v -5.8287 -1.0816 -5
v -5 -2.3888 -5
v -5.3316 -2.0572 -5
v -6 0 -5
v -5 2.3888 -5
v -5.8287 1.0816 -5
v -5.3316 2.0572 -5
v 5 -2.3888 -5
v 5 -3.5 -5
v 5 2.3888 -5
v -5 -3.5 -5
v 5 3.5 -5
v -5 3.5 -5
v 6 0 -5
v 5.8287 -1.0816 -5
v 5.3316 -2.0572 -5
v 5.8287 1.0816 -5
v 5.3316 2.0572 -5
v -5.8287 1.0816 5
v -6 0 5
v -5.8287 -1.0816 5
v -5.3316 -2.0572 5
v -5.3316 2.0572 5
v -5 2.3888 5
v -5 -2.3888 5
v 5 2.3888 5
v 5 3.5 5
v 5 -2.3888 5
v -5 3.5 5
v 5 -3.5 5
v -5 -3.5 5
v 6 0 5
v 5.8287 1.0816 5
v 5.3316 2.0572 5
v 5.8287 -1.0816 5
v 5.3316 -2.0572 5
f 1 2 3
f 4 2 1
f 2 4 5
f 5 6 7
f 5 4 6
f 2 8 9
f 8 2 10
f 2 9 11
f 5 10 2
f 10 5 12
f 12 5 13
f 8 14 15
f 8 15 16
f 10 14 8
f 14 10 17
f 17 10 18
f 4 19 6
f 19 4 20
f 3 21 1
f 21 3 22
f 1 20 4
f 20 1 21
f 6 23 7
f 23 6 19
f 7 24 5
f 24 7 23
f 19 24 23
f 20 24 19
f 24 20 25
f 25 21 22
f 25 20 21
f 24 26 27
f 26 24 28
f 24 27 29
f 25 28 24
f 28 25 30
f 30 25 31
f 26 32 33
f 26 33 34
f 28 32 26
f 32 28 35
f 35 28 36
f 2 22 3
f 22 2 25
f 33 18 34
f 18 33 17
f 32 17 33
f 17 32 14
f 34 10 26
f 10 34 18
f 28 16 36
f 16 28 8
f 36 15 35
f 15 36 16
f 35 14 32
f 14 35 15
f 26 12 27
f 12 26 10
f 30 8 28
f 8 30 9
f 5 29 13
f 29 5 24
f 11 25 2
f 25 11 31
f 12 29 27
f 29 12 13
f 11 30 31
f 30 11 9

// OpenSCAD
 
$fn = 20;

/* rc = rounded corners
   x, y, z = size
   r = radius of the corners
   h = height of the edge cube */
module rc(x, y, z, r, h) {
    echo("rc2CC x=", x, ", y=", y,", z=", z, ", r=", r);
    //%cube([x + (2 * r), y + (2 * r), z], center=true);

    cube([x, y + (2 * r), z], center=true);
    
    for (i = [-1, 1])
        translate([i * (x/2 - y/2), 0, 0])
            cylinder(r=((y / 2) + r), h=z, center=true);
    
    if (0 < h) {
        cd = 2 * ((y / 2) + r); /* cube diameter */
        for (i = [-1, 1])
            translate([i * (x/2 - y/2), 0, -(z / 2) + (h / 2)])
                cube([cd, cd, h], center=true);
        
    }
}

//rc(10, 1, 10, 1, 0);
rc(10, 5, 10, 1, 0);



/* FIXME: tady ji musim rict, kolikata karta to je */
module one_card(x, y, z, t, s, c, d, v, i) {
    difference() {
        rc(x, z, y*(1 - v), s + t, y*v);
        rc(x, z, y*(1 - v), s, 0);
    }
    
    /* cube to ground */
    tg = i*d;
    echo("i",i,"tg",tg);
    
    color("red")
    translate([0, 0, -(y * (1 - v) / 2) - (t/2) - tg/2])
        cube([
            x + 2 * (s + t),
            z + (s + t) * 2,
            t + tg
            ], center=true);
}

module draw_cardholder(x, y, z, t, s, c, d, v) {
    /* 0 - poradi karty, abych si dopocital jak moc bude vysoko */
    
    for (i=[1:c]) { //pro kazdou kartu
        translate([0,
            i*(t + 2*s + z), //y
            (i-1)*d + (y*(1-v))/2 + t //z
            ]) //pousun o delta
        one_card(x, y, z, t, s, c, d, v, (i - 1));
    }
    
}


module cardholder(
    size=[85, 54, 1],
    thickness=3,
    spacing=1,
    cards=2,//4,
    delta=25,
    visibility=0.3)
{
    draw = (len(size) < 2 || size[0] <= 0 ||
            size[1] <= 0 || cards <= 0) ? false : true;
    visibility = (visibility < 0) ? 0 : (1 < visibility) ? 1 : visibility;
    thickness = (thickness < 0) ? 0 : thickness;
    spacing = (spacing < 0) ? 0 : spacing;
    size = len(size) == 2 ? concat(size, 0) : size;
    
    echo("CARDHOLDER","draw",draw,"visibility",visibility,"thickness",thickness,
        "spacing",spacing,"size",size);

    x = size[0];
    y = size[1];
    z = size[2];   
    s = spacing;
    t = thickness;
    c = cards;
    d = delta;
    v = visibility;
    
    if (draw) {
        draw_cardholder(x,y,z,t,s,c,d,v);
    }
}

//cardholder();
